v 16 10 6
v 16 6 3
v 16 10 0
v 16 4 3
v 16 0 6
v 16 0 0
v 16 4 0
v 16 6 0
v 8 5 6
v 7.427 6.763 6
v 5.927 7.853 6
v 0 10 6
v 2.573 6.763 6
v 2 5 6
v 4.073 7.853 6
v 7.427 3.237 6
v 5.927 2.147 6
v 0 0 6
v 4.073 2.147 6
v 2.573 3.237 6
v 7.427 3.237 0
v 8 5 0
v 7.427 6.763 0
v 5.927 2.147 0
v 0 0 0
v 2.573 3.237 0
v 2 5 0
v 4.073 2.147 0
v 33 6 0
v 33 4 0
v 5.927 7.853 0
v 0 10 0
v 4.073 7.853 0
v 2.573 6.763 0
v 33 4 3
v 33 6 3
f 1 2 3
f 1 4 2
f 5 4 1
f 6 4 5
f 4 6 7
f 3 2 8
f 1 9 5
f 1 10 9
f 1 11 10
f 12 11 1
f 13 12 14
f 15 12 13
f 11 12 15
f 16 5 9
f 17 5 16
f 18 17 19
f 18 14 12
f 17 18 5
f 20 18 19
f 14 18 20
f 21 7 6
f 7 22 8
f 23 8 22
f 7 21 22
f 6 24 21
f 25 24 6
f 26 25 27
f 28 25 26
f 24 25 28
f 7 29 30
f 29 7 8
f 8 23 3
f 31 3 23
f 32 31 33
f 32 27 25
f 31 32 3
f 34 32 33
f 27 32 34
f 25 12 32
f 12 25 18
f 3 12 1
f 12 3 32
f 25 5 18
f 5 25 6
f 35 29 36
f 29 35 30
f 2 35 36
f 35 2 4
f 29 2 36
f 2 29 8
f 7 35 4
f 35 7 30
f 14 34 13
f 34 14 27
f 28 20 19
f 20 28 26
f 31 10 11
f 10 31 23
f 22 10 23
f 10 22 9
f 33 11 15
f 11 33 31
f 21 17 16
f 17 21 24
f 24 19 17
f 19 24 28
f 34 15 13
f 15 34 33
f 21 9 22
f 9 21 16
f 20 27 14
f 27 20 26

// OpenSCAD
module metered_slide() {
	difference() {
		union() {
			// main box
			cube([16,10,6]);
			// the pull
			translate([16,4,0])
				cube([17,2,3]);
		}
		// dump hole
		translate([5, 5, 3])
			cylinder(h = 6, r1 = 3, r2 = 3, center = true);
	}
}
metered_slide();
